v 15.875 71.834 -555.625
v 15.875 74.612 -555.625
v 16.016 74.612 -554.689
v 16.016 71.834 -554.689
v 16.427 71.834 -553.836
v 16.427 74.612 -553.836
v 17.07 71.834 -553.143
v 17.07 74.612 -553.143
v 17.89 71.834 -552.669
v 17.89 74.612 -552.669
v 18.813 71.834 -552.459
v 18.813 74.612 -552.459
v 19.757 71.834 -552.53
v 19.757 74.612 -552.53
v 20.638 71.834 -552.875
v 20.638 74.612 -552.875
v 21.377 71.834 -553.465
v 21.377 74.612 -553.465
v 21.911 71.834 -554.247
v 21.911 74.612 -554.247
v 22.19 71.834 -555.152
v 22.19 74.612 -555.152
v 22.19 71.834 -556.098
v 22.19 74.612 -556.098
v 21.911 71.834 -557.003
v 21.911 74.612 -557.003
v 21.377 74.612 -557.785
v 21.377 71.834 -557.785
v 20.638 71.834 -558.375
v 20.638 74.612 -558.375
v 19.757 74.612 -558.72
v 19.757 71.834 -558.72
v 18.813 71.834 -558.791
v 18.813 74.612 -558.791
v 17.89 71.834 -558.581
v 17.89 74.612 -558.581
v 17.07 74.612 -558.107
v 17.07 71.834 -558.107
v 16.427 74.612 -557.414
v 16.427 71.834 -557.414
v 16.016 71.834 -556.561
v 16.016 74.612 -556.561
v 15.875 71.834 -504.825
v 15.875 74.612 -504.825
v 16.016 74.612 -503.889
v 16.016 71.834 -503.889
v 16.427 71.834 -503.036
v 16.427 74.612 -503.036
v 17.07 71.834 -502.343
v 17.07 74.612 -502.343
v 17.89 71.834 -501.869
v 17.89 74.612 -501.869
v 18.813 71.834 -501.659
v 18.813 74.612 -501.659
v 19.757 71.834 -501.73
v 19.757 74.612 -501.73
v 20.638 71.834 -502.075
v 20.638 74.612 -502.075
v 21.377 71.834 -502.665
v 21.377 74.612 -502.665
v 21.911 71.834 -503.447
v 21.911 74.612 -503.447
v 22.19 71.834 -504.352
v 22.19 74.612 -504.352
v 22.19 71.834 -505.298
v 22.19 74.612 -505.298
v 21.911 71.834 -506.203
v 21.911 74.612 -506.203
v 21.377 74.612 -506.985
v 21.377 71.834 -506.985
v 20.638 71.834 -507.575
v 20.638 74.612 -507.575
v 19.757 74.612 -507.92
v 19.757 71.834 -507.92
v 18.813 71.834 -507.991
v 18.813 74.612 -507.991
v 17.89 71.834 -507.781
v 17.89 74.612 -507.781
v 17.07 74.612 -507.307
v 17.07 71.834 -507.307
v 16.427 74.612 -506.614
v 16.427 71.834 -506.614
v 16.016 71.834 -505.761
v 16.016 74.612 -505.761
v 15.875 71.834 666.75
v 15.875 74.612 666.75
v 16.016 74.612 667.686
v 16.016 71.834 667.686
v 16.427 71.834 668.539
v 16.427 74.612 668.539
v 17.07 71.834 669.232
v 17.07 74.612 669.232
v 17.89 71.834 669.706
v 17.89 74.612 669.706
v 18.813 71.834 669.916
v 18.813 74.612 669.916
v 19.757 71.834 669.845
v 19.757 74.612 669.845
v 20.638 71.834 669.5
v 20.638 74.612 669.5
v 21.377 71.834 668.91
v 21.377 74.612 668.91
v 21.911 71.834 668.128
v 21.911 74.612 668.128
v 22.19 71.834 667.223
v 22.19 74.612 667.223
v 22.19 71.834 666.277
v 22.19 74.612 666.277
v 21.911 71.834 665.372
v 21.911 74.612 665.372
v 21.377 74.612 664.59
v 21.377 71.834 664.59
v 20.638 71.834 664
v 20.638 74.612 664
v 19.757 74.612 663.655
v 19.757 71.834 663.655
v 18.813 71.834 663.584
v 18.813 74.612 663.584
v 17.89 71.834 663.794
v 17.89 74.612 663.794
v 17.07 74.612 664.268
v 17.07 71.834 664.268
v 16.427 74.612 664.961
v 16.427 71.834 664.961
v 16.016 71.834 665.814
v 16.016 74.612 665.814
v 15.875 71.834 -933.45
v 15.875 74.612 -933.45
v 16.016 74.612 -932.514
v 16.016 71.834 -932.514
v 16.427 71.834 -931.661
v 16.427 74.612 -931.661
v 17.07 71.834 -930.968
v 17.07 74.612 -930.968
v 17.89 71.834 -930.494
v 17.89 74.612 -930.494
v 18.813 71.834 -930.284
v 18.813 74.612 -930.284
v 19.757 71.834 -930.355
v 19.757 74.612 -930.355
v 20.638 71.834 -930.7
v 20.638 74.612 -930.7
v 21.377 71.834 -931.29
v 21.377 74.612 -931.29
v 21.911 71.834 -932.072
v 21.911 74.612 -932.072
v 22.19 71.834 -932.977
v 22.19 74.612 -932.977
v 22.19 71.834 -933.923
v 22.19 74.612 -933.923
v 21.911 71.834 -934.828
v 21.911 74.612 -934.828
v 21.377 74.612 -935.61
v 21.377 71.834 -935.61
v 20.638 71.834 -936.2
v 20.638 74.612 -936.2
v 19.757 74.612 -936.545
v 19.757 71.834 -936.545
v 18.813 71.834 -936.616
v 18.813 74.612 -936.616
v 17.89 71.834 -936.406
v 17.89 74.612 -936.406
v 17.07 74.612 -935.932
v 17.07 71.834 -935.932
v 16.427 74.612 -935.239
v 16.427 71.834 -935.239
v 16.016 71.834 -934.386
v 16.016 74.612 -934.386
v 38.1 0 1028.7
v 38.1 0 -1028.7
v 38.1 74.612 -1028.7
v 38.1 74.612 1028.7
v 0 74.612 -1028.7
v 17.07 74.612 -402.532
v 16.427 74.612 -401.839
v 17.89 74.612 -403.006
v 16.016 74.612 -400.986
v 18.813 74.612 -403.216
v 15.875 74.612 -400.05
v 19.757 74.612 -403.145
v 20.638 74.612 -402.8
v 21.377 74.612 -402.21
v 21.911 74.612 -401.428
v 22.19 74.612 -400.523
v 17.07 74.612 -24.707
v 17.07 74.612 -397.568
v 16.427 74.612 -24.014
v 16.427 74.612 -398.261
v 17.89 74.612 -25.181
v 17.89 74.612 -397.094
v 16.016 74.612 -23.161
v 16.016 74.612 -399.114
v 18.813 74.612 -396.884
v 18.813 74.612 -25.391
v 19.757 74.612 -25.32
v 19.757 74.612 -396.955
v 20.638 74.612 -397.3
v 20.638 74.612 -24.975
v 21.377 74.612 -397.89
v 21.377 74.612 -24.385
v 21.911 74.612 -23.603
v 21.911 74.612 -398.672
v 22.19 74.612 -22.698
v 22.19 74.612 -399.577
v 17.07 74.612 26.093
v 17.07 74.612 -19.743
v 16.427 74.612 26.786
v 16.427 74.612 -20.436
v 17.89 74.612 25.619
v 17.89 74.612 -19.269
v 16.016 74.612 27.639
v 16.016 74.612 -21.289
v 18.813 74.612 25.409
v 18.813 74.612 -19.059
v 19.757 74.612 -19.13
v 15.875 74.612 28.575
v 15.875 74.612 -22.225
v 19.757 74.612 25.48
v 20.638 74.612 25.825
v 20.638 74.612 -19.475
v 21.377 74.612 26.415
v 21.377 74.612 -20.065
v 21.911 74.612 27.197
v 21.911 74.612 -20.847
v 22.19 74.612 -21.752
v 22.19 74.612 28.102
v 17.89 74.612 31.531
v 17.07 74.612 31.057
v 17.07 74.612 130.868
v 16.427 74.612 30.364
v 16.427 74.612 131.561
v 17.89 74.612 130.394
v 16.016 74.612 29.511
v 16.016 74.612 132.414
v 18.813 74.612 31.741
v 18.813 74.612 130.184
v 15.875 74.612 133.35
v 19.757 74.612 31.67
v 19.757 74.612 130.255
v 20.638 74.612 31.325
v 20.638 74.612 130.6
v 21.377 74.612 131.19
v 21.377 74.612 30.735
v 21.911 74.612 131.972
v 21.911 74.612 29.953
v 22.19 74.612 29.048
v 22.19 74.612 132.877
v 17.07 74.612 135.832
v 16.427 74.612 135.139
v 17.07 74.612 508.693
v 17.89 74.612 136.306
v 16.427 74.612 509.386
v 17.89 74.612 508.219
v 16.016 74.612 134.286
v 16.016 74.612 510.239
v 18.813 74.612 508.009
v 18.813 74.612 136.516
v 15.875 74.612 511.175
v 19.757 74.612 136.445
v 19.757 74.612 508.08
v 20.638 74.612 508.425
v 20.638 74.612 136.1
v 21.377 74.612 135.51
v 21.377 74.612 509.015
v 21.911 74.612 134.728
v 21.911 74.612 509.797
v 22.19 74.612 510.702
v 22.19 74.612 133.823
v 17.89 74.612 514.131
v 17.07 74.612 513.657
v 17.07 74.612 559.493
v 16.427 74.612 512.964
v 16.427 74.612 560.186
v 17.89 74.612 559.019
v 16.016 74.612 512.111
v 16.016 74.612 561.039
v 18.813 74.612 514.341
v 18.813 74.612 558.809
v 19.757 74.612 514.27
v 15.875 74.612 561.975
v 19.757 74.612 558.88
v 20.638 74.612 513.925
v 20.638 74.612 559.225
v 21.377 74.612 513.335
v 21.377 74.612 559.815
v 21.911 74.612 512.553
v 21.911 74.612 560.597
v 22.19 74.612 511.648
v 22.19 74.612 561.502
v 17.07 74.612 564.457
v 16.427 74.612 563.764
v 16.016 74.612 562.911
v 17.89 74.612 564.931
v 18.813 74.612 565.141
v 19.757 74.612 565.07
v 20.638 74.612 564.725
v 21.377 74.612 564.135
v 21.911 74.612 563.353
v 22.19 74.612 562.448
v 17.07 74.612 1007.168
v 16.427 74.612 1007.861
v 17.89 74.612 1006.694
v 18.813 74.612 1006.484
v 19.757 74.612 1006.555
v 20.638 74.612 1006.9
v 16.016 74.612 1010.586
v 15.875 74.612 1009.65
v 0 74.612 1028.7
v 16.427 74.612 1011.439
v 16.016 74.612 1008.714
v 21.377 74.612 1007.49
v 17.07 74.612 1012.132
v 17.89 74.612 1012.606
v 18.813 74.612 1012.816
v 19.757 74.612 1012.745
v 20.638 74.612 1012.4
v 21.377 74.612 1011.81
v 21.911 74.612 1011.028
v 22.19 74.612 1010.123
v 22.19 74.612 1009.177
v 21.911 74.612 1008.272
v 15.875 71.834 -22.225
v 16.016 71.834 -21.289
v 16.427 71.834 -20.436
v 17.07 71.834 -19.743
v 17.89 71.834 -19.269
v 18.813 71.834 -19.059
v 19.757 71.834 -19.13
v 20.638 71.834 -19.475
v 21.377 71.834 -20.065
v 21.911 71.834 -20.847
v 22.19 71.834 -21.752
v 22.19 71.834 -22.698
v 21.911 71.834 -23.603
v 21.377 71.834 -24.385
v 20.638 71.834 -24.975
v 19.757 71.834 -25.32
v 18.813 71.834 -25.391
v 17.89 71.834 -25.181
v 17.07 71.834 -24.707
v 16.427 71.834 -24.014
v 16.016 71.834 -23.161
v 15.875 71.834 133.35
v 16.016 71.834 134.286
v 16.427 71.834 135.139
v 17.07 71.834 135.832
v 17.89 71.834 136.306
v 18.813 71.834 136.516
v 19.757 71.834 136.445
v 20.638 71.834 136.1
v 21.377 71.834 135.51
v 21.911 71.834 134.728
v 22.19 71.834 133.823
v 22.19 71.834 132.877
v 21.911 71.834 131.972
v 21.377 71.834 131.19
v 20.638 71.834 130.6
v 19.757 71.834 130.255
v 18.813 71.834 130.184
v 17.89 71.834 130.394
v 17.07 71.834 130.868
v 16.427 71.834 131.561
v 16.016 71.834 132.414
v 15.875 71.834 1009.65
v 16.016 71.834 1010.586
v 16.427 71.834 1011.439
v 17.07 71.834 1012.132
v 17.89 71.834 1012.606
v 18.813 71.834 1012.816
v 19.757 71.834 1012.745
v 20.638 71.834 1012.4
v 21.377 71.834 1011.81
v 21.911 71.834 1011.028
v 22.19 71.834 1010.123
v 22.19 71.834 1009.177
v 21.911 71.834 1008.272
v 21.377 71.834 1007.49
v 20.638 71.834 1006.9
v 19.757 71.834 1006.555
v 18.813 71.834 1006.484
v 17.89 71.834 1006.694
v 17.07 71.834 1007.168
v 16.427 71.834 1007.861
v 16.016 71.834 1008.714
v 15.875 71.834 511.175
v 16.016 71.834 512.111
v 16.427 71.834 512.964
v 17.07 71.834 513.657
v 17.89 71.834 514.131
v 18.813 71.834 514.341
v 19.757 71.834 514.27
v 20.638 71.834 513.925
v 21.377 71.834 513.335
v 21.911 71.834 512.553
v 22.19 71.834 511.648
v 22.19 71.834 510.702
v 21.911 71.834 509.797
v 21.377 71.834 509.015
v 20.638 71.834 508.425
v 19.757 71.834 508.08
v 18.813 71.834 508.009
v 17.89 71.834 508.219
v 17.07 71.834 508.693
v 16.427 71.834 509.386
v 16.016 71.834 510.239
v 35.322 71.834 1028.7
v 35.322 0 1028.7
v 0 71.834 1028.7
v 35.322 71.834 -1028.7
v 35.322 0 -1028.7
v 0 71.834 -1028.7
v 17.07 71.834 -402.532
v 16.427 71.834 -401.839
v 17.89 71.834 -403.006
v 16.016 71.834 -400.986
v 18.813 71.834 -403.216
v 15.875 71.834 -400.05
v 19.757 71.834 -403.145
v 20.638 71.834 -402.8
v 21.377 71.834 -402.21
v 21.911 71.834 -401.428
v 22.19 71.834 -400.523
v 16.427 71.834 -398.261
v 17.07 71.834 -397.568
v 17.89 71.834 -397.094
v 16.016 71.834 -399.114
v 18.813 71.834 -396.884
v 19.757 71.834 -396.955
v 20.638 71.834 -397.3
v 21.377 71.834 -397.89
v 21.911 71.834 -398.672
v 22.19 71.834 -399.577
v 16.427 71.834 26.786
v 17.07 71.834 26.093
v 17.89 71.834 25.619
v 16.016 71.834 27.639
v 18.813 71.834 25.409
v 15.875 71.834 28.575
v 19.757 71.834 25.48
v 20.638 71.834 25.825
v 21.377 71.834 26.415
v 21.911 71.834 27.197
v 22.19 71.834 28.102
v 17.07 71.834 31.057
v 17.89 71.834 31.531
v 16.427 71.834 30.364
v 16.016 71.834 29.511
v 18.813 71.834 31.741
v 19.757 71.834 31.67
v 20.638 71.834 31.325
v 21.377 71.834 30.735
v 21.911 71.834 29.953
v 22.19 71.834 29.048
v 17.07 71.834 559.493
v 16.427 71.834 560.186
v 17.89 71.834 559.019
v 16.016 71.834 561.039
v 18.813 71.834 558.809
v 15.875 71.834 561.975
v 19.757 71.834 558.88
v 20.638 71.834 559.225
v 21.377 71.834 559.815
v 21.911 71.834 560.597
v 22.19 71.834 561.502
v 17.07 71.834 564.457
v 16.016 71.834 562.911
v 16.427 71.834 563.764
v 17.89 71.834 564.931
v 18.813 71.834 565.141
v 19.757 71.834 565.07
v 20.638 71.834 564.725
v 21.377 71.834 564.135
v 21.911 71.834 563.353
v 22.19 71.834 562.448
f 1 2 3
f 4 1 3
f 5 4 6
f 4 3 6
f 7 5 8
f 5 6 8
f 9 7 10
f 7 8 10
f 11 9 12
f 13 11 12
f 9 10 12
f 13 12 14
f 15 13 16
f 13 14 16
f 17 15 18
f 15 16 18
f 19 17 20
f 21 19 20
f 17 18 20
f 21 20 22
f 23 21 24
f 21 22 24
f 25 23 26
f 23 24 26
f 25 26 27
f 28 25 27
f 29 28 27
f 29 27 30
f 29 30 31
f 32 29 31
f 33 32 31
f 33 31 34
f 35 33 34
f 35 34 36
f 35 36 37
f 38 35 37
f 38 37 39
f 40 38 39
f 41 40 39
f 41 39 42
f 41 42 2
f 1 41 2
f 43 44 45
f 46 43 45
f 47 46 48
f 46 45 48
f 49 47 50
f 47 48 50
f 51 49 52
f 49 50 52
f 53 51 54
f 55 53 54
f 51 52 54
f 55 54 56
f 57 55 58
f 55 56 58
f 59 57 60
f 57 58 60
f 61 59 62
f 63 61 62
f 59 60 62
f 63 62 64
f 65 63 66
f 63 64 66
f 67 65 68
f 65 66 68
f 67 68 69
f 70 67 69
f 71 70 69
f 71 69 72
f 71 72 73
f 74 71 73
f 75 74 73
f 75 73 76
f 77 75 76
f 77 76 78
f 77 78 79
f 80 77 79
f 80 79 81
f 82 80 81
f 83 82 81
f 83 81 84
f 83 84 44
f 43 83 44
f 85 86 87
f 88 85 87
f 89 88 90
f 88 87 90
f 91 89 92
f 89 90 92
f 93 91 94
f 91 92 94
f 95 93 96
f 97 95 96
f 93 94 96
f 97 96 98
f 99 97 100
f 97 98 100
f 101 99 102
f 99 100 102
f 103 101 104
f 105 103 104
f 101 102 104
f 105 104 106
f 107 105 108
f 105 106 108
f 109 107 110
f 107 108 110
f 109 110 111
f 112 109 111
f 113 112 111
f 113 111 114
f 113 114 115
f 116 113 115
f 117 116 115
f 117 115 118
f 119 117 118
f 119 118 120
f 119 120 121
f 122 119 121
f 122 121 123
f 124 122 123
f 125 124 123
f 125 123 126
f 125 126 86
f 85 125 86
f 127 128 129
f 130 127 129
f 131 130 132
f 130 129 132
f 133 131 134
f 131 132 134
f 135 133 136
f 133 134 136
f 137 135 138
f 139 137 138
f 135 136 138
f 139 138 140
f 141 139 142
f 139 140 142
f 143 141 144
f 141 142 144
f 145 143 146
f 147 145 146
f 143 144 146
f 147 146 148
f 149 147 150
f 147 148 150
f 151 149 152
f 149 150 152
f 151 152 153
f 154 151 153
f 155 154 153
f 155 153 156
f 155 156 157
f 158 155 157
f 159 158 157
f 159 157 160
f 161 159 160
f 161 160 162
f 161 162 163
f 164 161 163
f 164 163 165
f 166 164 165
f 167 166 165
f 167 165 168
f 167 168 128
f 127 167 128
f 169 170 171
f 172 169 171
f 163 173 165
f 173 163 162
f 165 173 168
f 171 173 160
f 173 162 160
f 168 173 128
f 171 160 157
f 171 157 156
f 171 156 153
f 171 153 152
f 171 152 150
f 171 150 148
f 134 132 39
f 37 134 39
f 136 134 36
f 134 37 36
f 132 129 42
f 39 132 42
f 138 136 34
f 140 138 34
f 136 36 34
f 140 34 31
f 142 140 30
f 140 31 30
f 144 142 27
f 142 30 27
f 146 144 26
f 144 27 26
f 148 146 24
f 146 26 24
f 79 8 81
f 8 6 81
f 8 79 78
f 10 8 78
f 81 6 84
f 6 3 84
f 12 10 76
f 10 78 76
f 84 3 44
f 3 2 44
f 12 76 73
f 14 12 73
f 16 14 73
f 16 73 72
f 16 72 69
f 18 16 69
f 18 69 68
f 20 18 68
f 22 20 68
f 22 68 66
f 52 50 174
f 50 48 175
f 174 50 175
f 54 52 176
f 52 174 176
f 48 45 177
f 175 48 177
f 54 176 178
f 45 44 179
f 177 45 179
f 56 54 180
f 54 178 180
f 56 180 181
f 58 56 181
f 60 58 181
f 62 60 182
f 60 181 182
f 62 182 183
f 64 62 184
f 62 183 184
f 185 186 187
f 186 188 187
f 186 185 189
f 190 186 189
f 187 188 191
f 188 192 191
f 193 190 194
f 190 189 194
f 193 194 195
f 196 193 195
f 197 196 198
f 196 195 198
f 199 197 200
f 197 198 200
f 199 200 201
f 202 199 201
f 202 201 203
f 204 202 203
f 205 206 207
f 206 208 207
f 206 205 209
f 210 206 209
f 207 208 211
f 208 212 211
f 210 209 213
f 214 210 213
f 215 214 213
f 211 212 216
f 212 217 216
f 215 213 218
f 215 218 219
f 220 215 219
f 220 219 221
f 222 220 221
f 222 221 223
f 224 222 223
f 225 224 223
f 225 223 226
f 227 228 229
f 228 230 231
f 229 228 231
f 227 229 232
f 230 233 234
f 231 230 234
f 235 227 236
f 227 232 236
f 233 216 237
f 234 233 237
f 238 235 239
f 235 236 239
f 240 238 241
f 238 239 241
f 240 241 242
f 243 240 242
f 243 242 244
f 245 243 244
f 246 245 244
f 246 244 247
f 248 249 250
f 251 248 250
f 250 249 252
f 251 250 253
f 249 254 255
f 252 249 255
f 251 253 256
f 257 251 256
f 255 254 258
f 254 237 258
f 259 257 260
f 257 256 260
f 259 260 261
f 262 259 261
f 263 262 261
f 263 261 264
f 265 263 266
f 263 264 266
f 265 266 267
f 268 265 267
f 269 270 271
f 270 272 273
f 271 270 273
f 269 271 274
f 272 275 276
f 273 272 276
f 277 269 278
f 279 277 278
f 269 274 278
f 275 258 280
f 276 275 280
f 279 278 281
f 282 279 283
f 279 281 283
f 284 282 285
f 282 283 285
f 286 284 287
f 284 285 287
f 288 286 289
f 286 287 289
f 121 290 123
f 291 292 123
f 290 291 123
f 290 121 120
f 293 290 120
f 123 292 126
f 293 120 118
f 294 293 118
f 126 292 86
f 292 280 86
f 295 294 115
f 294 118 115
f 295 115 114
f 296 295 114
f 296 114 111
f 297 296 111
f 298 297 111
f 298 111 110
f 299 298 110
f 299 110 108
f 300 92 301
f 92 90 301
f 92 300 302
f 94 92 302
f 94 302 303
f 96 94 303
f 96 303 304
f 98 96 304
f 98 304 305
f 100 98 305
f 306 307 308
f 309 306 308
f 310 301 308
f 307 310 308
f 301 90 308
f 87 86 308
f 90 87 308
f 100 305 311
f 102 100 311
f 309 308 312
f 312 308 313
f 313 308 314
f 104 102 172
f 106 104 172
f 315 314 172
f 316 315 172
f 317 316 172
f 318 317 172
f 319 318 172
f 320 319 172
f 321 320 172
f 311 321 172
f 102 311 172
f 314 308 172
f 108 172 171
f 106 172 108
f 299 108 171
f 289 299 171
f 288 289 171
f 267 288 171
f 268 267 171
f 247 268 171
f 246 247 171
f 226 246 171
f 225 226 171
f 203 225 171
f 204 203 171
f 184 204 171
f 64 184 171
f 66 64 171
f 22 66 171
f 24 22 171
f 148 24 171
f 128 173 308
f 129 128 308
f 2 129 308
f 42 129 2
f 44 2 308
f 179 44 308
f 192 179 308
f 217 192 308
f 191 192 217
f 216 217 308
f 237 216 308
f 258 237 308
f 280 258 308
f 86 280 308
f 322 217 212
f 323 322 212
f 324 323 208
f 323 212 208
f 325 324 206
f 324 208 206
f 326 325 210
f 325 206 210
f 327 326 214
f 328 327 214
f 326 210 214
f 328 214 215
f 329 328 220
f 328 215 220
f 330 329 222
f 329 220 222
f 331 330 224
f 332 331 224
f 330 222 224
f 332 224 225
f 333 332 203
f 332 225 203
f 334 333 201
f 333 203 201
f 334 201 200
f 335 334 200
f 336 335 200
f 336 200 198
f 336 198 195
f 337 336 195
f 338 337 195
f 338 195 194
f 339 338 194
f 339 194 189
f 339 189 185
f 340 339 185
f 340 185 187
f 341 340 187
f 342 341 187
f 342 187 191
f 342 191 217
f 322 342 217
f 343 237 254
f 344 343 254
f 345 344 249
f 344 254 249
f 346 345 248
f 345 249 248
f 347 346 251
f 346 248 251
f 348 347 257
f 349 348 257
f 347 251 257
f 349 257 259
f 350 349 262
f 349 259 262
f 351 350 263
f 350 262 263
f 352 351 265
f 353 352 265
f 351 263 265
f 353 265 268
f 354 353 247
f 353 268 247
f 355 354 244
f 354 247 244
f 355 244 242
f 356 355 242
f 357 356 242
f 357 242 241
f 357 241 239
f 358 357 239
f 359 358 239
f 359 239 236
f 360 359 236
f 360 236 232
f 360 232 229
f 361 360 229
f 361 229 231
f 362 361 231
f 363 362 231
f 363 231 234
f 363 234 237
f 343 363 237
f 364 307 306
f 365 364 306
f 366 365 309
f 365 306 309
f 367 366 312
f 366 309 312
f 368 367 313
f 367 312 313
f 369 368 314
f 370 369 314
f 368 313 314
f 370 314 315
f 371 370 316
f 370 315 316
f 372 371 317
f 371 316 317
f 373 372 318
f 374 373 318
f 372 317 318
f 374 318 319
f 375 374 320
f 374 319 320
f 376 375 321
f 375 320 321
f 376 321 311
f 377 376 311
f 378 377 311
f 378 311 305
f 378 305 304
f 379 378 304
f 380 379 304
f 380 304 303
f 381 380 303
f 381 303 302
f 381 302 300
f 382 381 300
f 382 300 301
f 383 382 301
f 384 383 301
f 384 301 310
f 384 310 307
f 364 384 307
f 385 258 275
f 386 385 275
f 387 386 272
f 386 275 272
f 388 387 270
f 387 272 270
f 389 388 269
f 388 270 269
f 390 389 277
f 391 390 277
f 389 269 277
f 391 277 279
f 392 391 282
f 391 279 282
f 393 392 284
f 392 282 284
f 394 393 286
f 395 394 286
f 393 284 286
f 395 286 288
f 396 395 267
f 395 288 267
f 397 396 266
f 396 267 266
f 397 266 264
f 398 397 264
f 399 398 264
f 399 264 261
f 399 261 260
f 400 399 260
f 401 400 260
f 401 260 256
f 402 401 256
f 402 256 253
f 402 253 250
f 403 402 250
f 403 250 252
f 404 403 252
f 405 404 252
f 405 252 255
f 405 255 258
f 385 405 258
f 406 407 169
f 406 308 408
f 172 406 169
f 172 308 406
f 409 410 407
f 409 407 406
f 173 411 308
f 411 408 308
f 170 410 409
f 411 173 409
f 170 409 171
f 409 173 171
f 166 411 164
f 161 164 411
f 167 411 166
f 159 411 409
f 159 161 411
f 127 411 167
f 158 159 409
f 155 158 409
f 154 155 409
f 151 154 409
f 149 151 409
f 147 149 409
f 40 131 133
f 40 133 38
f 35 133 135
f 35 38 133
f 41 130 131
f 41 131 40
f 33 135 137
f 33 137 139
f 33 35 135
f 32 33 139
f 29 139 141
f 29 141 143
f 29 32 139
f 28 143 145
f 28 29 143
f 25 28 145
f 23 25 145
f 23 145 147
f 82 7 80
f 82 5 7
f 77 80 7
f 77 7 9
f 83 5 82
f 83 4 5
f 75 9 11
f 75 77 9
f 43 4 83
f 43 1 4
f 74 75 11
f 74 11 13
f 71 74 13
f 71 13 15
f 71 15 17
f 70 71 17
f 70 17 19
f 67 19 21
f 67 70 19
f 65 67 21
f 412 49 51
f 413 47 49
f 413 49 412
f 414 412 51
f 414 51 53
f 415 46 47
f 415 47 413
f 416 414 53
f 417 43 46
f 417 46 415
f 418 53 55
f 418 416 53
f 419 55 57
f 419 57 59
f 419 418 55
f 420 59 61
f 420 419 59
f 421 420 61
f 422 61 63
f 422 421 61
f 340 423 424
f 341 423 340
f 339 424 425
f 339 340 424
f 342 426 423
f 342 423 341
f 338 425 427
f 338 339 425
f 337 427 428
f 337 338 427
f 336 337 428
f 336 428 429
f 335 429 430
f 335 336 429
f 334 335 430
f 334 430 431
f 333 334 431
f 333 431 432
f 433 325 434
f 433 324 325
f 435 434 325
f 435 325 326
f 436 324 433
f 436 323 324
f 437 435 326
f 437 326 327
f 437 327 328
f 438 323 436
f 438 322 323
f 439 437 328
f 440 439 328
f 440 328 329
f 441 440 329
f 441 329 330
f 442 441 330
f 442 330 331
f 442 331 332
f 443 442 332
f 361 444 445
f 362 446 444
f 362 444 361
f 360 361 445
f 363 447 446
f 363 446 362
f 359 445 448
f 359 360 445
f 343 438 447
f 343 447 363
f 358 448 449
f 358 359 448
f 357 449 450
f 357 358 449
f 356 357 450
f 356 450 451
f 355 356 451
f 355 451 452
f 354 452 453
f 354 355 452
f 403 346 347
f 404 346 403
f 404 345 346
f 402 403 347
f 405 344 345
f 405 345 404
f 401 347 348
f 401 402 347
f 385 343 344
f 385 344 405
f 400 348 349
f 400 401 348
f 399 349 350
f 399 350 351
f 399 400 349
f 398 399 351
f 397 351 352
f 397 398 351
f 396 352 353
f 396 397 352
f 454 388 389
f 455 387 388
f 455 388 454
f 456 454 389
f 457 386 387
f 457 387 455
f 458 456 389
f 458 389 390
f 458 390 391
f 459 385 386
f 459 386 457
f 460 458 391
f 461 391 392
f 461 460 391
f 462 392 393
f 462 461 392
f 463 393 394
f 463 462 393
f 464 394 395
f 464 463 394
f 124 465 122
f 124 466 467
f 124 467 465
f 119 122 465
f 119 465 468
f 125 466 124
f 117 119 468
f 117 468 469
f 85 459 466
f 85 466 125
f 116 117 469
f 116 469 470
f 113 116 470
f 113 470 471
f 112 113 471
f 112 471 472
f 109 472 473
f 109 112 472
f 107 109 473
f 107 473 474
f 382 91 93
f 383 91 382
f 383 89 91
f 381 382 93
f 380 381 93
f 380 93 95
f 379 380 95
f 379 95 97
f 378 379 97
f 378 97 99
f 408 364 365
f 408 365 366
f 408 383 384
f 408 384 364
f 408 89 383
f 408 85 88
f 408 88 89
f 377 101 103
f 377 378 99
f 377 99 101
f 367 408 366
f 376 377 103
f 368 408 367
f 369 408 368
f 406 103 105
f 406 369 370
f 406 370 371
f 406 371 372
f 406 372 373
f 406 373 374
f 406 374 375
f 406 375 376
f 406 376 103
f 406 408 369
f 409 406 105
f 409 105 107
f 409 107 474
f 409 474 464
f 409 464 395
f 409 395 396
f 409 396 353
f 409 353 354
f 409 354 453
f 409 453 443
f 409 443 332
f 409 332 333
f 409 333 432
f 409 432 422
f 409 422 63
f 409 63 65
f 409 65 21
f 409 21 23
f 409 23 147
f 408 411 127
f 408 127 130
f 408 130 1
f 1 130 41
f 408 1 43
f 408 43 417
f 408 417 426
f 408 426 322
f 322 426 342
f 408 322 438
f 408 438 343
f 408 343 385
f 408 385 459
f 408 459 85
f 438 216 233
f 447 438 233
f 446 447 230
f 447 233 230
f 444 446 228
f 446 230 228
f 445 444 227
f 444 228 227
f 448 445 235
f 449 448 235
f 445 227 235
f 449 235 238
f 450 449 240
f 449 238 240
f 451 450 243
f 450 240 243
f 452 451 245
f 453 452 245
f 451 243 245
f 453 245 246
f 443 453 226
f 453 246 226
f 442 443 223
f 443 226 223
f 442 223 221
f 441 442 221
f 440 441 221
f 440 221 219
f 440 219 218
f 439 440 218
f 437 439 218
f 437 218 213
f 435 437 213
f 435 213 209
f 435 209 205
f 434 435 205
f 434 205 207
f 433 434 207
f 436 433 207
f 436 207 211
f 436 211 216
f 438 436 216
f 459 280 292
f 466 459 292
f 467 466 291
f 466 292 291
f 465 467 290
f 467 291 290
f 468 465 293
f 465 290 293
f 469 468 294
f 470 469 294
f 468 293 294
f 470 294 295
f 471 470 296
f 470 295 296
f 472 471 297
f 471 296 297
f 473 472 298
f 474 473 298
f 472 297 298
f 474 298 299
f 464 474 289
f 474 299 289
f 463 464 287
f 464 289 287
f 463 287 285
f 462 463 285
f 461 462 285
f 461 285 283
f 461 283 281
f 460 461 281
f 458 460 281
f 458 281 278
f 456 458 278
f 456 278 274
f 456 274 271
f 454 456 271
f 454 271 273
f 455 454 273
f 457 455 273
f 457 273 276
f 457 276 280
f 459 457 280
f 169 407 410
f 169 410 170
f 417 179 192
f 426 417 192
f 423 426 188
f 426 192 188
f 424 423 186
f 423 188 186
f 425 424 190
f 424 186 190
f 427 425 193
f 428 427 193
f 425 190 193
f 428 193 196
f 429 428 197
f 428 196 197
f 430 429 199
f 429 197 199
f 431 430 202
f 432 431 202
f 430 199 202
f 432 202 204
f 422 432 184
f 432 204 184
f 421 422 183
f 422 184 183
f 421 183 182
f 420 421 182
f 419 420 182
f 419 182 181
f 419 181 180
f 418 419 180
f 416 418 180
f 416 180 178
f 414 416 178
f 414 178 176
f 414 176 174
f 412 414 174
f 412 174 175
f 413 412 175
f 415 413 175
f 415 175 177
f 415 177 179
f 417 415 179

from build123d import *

# Parameters (mm, degrees)
F0_W     = 38.1
F0_H     = 74.6125
F1_DEPTH = 1028.7
F2_T     = -2.778125
F3_R     = 3.175
F4_DEPTH = 74.6135


with BuildPart() as f1:
    # F0 (on Top) → F1 (new body, symmetric)
    with BuildSketch(Plane.XY):
        with Locations((19.05, 37.30625)):
            Rectangle(F0_W, F0_H)
    extrude(amount=F1_DEPTH, both=True)

    # F2
    f2_openings = [f1.faces().sort_by_distance(p)[0] for p in [
        (19.05, 37.30625, 1028.7),
        (19.05, 0, 0),
        (19.05, 37.30625, -1028.7),
        (0, 37.30625, 0),
    ]]
    offset(amount=F2_T, openings=f2_openings)

    # F3 (on face) → F4 (cut, through all)
    with BuildSketch(Plane(origin=(0, 74.6125, 0), x_dir=(-1, 0, 0), z_dir=(0, 1, 0))):
        with Locations((-19.05, 561.975)):
            Circle(F3_R)
        with Locations((-19.05, 511.175)):
            Circle(F3_R)
        with Locations((-19.05, 133.35)):
            Circle(F3_R)
        with Locations((-19.05, -22.225)):
            Circle(F3_R)
        with Locations((-19.05, 28.575)):
            Circle(F3_R)
        with Locations((-19.05, -400.05)):
            Circle(F3_R)
        with Locations((-19.05, -555.625)):
            Circle(F3_R)
        with Locations((-19.05, -504.825)):
            Circle(F3_R)
        with Locations((-19.05, -933.45)):
            Circle(F3_R)
        with Locations((-19.05, 666.75)):
            Circle(F3_R)
        with Locations((-19.05, 1009.65)):
            Circle(F3_R)
    extrude(amount=-F4_DEPTH, mode=Mode.SUBTRACT)


solid = f1.part
